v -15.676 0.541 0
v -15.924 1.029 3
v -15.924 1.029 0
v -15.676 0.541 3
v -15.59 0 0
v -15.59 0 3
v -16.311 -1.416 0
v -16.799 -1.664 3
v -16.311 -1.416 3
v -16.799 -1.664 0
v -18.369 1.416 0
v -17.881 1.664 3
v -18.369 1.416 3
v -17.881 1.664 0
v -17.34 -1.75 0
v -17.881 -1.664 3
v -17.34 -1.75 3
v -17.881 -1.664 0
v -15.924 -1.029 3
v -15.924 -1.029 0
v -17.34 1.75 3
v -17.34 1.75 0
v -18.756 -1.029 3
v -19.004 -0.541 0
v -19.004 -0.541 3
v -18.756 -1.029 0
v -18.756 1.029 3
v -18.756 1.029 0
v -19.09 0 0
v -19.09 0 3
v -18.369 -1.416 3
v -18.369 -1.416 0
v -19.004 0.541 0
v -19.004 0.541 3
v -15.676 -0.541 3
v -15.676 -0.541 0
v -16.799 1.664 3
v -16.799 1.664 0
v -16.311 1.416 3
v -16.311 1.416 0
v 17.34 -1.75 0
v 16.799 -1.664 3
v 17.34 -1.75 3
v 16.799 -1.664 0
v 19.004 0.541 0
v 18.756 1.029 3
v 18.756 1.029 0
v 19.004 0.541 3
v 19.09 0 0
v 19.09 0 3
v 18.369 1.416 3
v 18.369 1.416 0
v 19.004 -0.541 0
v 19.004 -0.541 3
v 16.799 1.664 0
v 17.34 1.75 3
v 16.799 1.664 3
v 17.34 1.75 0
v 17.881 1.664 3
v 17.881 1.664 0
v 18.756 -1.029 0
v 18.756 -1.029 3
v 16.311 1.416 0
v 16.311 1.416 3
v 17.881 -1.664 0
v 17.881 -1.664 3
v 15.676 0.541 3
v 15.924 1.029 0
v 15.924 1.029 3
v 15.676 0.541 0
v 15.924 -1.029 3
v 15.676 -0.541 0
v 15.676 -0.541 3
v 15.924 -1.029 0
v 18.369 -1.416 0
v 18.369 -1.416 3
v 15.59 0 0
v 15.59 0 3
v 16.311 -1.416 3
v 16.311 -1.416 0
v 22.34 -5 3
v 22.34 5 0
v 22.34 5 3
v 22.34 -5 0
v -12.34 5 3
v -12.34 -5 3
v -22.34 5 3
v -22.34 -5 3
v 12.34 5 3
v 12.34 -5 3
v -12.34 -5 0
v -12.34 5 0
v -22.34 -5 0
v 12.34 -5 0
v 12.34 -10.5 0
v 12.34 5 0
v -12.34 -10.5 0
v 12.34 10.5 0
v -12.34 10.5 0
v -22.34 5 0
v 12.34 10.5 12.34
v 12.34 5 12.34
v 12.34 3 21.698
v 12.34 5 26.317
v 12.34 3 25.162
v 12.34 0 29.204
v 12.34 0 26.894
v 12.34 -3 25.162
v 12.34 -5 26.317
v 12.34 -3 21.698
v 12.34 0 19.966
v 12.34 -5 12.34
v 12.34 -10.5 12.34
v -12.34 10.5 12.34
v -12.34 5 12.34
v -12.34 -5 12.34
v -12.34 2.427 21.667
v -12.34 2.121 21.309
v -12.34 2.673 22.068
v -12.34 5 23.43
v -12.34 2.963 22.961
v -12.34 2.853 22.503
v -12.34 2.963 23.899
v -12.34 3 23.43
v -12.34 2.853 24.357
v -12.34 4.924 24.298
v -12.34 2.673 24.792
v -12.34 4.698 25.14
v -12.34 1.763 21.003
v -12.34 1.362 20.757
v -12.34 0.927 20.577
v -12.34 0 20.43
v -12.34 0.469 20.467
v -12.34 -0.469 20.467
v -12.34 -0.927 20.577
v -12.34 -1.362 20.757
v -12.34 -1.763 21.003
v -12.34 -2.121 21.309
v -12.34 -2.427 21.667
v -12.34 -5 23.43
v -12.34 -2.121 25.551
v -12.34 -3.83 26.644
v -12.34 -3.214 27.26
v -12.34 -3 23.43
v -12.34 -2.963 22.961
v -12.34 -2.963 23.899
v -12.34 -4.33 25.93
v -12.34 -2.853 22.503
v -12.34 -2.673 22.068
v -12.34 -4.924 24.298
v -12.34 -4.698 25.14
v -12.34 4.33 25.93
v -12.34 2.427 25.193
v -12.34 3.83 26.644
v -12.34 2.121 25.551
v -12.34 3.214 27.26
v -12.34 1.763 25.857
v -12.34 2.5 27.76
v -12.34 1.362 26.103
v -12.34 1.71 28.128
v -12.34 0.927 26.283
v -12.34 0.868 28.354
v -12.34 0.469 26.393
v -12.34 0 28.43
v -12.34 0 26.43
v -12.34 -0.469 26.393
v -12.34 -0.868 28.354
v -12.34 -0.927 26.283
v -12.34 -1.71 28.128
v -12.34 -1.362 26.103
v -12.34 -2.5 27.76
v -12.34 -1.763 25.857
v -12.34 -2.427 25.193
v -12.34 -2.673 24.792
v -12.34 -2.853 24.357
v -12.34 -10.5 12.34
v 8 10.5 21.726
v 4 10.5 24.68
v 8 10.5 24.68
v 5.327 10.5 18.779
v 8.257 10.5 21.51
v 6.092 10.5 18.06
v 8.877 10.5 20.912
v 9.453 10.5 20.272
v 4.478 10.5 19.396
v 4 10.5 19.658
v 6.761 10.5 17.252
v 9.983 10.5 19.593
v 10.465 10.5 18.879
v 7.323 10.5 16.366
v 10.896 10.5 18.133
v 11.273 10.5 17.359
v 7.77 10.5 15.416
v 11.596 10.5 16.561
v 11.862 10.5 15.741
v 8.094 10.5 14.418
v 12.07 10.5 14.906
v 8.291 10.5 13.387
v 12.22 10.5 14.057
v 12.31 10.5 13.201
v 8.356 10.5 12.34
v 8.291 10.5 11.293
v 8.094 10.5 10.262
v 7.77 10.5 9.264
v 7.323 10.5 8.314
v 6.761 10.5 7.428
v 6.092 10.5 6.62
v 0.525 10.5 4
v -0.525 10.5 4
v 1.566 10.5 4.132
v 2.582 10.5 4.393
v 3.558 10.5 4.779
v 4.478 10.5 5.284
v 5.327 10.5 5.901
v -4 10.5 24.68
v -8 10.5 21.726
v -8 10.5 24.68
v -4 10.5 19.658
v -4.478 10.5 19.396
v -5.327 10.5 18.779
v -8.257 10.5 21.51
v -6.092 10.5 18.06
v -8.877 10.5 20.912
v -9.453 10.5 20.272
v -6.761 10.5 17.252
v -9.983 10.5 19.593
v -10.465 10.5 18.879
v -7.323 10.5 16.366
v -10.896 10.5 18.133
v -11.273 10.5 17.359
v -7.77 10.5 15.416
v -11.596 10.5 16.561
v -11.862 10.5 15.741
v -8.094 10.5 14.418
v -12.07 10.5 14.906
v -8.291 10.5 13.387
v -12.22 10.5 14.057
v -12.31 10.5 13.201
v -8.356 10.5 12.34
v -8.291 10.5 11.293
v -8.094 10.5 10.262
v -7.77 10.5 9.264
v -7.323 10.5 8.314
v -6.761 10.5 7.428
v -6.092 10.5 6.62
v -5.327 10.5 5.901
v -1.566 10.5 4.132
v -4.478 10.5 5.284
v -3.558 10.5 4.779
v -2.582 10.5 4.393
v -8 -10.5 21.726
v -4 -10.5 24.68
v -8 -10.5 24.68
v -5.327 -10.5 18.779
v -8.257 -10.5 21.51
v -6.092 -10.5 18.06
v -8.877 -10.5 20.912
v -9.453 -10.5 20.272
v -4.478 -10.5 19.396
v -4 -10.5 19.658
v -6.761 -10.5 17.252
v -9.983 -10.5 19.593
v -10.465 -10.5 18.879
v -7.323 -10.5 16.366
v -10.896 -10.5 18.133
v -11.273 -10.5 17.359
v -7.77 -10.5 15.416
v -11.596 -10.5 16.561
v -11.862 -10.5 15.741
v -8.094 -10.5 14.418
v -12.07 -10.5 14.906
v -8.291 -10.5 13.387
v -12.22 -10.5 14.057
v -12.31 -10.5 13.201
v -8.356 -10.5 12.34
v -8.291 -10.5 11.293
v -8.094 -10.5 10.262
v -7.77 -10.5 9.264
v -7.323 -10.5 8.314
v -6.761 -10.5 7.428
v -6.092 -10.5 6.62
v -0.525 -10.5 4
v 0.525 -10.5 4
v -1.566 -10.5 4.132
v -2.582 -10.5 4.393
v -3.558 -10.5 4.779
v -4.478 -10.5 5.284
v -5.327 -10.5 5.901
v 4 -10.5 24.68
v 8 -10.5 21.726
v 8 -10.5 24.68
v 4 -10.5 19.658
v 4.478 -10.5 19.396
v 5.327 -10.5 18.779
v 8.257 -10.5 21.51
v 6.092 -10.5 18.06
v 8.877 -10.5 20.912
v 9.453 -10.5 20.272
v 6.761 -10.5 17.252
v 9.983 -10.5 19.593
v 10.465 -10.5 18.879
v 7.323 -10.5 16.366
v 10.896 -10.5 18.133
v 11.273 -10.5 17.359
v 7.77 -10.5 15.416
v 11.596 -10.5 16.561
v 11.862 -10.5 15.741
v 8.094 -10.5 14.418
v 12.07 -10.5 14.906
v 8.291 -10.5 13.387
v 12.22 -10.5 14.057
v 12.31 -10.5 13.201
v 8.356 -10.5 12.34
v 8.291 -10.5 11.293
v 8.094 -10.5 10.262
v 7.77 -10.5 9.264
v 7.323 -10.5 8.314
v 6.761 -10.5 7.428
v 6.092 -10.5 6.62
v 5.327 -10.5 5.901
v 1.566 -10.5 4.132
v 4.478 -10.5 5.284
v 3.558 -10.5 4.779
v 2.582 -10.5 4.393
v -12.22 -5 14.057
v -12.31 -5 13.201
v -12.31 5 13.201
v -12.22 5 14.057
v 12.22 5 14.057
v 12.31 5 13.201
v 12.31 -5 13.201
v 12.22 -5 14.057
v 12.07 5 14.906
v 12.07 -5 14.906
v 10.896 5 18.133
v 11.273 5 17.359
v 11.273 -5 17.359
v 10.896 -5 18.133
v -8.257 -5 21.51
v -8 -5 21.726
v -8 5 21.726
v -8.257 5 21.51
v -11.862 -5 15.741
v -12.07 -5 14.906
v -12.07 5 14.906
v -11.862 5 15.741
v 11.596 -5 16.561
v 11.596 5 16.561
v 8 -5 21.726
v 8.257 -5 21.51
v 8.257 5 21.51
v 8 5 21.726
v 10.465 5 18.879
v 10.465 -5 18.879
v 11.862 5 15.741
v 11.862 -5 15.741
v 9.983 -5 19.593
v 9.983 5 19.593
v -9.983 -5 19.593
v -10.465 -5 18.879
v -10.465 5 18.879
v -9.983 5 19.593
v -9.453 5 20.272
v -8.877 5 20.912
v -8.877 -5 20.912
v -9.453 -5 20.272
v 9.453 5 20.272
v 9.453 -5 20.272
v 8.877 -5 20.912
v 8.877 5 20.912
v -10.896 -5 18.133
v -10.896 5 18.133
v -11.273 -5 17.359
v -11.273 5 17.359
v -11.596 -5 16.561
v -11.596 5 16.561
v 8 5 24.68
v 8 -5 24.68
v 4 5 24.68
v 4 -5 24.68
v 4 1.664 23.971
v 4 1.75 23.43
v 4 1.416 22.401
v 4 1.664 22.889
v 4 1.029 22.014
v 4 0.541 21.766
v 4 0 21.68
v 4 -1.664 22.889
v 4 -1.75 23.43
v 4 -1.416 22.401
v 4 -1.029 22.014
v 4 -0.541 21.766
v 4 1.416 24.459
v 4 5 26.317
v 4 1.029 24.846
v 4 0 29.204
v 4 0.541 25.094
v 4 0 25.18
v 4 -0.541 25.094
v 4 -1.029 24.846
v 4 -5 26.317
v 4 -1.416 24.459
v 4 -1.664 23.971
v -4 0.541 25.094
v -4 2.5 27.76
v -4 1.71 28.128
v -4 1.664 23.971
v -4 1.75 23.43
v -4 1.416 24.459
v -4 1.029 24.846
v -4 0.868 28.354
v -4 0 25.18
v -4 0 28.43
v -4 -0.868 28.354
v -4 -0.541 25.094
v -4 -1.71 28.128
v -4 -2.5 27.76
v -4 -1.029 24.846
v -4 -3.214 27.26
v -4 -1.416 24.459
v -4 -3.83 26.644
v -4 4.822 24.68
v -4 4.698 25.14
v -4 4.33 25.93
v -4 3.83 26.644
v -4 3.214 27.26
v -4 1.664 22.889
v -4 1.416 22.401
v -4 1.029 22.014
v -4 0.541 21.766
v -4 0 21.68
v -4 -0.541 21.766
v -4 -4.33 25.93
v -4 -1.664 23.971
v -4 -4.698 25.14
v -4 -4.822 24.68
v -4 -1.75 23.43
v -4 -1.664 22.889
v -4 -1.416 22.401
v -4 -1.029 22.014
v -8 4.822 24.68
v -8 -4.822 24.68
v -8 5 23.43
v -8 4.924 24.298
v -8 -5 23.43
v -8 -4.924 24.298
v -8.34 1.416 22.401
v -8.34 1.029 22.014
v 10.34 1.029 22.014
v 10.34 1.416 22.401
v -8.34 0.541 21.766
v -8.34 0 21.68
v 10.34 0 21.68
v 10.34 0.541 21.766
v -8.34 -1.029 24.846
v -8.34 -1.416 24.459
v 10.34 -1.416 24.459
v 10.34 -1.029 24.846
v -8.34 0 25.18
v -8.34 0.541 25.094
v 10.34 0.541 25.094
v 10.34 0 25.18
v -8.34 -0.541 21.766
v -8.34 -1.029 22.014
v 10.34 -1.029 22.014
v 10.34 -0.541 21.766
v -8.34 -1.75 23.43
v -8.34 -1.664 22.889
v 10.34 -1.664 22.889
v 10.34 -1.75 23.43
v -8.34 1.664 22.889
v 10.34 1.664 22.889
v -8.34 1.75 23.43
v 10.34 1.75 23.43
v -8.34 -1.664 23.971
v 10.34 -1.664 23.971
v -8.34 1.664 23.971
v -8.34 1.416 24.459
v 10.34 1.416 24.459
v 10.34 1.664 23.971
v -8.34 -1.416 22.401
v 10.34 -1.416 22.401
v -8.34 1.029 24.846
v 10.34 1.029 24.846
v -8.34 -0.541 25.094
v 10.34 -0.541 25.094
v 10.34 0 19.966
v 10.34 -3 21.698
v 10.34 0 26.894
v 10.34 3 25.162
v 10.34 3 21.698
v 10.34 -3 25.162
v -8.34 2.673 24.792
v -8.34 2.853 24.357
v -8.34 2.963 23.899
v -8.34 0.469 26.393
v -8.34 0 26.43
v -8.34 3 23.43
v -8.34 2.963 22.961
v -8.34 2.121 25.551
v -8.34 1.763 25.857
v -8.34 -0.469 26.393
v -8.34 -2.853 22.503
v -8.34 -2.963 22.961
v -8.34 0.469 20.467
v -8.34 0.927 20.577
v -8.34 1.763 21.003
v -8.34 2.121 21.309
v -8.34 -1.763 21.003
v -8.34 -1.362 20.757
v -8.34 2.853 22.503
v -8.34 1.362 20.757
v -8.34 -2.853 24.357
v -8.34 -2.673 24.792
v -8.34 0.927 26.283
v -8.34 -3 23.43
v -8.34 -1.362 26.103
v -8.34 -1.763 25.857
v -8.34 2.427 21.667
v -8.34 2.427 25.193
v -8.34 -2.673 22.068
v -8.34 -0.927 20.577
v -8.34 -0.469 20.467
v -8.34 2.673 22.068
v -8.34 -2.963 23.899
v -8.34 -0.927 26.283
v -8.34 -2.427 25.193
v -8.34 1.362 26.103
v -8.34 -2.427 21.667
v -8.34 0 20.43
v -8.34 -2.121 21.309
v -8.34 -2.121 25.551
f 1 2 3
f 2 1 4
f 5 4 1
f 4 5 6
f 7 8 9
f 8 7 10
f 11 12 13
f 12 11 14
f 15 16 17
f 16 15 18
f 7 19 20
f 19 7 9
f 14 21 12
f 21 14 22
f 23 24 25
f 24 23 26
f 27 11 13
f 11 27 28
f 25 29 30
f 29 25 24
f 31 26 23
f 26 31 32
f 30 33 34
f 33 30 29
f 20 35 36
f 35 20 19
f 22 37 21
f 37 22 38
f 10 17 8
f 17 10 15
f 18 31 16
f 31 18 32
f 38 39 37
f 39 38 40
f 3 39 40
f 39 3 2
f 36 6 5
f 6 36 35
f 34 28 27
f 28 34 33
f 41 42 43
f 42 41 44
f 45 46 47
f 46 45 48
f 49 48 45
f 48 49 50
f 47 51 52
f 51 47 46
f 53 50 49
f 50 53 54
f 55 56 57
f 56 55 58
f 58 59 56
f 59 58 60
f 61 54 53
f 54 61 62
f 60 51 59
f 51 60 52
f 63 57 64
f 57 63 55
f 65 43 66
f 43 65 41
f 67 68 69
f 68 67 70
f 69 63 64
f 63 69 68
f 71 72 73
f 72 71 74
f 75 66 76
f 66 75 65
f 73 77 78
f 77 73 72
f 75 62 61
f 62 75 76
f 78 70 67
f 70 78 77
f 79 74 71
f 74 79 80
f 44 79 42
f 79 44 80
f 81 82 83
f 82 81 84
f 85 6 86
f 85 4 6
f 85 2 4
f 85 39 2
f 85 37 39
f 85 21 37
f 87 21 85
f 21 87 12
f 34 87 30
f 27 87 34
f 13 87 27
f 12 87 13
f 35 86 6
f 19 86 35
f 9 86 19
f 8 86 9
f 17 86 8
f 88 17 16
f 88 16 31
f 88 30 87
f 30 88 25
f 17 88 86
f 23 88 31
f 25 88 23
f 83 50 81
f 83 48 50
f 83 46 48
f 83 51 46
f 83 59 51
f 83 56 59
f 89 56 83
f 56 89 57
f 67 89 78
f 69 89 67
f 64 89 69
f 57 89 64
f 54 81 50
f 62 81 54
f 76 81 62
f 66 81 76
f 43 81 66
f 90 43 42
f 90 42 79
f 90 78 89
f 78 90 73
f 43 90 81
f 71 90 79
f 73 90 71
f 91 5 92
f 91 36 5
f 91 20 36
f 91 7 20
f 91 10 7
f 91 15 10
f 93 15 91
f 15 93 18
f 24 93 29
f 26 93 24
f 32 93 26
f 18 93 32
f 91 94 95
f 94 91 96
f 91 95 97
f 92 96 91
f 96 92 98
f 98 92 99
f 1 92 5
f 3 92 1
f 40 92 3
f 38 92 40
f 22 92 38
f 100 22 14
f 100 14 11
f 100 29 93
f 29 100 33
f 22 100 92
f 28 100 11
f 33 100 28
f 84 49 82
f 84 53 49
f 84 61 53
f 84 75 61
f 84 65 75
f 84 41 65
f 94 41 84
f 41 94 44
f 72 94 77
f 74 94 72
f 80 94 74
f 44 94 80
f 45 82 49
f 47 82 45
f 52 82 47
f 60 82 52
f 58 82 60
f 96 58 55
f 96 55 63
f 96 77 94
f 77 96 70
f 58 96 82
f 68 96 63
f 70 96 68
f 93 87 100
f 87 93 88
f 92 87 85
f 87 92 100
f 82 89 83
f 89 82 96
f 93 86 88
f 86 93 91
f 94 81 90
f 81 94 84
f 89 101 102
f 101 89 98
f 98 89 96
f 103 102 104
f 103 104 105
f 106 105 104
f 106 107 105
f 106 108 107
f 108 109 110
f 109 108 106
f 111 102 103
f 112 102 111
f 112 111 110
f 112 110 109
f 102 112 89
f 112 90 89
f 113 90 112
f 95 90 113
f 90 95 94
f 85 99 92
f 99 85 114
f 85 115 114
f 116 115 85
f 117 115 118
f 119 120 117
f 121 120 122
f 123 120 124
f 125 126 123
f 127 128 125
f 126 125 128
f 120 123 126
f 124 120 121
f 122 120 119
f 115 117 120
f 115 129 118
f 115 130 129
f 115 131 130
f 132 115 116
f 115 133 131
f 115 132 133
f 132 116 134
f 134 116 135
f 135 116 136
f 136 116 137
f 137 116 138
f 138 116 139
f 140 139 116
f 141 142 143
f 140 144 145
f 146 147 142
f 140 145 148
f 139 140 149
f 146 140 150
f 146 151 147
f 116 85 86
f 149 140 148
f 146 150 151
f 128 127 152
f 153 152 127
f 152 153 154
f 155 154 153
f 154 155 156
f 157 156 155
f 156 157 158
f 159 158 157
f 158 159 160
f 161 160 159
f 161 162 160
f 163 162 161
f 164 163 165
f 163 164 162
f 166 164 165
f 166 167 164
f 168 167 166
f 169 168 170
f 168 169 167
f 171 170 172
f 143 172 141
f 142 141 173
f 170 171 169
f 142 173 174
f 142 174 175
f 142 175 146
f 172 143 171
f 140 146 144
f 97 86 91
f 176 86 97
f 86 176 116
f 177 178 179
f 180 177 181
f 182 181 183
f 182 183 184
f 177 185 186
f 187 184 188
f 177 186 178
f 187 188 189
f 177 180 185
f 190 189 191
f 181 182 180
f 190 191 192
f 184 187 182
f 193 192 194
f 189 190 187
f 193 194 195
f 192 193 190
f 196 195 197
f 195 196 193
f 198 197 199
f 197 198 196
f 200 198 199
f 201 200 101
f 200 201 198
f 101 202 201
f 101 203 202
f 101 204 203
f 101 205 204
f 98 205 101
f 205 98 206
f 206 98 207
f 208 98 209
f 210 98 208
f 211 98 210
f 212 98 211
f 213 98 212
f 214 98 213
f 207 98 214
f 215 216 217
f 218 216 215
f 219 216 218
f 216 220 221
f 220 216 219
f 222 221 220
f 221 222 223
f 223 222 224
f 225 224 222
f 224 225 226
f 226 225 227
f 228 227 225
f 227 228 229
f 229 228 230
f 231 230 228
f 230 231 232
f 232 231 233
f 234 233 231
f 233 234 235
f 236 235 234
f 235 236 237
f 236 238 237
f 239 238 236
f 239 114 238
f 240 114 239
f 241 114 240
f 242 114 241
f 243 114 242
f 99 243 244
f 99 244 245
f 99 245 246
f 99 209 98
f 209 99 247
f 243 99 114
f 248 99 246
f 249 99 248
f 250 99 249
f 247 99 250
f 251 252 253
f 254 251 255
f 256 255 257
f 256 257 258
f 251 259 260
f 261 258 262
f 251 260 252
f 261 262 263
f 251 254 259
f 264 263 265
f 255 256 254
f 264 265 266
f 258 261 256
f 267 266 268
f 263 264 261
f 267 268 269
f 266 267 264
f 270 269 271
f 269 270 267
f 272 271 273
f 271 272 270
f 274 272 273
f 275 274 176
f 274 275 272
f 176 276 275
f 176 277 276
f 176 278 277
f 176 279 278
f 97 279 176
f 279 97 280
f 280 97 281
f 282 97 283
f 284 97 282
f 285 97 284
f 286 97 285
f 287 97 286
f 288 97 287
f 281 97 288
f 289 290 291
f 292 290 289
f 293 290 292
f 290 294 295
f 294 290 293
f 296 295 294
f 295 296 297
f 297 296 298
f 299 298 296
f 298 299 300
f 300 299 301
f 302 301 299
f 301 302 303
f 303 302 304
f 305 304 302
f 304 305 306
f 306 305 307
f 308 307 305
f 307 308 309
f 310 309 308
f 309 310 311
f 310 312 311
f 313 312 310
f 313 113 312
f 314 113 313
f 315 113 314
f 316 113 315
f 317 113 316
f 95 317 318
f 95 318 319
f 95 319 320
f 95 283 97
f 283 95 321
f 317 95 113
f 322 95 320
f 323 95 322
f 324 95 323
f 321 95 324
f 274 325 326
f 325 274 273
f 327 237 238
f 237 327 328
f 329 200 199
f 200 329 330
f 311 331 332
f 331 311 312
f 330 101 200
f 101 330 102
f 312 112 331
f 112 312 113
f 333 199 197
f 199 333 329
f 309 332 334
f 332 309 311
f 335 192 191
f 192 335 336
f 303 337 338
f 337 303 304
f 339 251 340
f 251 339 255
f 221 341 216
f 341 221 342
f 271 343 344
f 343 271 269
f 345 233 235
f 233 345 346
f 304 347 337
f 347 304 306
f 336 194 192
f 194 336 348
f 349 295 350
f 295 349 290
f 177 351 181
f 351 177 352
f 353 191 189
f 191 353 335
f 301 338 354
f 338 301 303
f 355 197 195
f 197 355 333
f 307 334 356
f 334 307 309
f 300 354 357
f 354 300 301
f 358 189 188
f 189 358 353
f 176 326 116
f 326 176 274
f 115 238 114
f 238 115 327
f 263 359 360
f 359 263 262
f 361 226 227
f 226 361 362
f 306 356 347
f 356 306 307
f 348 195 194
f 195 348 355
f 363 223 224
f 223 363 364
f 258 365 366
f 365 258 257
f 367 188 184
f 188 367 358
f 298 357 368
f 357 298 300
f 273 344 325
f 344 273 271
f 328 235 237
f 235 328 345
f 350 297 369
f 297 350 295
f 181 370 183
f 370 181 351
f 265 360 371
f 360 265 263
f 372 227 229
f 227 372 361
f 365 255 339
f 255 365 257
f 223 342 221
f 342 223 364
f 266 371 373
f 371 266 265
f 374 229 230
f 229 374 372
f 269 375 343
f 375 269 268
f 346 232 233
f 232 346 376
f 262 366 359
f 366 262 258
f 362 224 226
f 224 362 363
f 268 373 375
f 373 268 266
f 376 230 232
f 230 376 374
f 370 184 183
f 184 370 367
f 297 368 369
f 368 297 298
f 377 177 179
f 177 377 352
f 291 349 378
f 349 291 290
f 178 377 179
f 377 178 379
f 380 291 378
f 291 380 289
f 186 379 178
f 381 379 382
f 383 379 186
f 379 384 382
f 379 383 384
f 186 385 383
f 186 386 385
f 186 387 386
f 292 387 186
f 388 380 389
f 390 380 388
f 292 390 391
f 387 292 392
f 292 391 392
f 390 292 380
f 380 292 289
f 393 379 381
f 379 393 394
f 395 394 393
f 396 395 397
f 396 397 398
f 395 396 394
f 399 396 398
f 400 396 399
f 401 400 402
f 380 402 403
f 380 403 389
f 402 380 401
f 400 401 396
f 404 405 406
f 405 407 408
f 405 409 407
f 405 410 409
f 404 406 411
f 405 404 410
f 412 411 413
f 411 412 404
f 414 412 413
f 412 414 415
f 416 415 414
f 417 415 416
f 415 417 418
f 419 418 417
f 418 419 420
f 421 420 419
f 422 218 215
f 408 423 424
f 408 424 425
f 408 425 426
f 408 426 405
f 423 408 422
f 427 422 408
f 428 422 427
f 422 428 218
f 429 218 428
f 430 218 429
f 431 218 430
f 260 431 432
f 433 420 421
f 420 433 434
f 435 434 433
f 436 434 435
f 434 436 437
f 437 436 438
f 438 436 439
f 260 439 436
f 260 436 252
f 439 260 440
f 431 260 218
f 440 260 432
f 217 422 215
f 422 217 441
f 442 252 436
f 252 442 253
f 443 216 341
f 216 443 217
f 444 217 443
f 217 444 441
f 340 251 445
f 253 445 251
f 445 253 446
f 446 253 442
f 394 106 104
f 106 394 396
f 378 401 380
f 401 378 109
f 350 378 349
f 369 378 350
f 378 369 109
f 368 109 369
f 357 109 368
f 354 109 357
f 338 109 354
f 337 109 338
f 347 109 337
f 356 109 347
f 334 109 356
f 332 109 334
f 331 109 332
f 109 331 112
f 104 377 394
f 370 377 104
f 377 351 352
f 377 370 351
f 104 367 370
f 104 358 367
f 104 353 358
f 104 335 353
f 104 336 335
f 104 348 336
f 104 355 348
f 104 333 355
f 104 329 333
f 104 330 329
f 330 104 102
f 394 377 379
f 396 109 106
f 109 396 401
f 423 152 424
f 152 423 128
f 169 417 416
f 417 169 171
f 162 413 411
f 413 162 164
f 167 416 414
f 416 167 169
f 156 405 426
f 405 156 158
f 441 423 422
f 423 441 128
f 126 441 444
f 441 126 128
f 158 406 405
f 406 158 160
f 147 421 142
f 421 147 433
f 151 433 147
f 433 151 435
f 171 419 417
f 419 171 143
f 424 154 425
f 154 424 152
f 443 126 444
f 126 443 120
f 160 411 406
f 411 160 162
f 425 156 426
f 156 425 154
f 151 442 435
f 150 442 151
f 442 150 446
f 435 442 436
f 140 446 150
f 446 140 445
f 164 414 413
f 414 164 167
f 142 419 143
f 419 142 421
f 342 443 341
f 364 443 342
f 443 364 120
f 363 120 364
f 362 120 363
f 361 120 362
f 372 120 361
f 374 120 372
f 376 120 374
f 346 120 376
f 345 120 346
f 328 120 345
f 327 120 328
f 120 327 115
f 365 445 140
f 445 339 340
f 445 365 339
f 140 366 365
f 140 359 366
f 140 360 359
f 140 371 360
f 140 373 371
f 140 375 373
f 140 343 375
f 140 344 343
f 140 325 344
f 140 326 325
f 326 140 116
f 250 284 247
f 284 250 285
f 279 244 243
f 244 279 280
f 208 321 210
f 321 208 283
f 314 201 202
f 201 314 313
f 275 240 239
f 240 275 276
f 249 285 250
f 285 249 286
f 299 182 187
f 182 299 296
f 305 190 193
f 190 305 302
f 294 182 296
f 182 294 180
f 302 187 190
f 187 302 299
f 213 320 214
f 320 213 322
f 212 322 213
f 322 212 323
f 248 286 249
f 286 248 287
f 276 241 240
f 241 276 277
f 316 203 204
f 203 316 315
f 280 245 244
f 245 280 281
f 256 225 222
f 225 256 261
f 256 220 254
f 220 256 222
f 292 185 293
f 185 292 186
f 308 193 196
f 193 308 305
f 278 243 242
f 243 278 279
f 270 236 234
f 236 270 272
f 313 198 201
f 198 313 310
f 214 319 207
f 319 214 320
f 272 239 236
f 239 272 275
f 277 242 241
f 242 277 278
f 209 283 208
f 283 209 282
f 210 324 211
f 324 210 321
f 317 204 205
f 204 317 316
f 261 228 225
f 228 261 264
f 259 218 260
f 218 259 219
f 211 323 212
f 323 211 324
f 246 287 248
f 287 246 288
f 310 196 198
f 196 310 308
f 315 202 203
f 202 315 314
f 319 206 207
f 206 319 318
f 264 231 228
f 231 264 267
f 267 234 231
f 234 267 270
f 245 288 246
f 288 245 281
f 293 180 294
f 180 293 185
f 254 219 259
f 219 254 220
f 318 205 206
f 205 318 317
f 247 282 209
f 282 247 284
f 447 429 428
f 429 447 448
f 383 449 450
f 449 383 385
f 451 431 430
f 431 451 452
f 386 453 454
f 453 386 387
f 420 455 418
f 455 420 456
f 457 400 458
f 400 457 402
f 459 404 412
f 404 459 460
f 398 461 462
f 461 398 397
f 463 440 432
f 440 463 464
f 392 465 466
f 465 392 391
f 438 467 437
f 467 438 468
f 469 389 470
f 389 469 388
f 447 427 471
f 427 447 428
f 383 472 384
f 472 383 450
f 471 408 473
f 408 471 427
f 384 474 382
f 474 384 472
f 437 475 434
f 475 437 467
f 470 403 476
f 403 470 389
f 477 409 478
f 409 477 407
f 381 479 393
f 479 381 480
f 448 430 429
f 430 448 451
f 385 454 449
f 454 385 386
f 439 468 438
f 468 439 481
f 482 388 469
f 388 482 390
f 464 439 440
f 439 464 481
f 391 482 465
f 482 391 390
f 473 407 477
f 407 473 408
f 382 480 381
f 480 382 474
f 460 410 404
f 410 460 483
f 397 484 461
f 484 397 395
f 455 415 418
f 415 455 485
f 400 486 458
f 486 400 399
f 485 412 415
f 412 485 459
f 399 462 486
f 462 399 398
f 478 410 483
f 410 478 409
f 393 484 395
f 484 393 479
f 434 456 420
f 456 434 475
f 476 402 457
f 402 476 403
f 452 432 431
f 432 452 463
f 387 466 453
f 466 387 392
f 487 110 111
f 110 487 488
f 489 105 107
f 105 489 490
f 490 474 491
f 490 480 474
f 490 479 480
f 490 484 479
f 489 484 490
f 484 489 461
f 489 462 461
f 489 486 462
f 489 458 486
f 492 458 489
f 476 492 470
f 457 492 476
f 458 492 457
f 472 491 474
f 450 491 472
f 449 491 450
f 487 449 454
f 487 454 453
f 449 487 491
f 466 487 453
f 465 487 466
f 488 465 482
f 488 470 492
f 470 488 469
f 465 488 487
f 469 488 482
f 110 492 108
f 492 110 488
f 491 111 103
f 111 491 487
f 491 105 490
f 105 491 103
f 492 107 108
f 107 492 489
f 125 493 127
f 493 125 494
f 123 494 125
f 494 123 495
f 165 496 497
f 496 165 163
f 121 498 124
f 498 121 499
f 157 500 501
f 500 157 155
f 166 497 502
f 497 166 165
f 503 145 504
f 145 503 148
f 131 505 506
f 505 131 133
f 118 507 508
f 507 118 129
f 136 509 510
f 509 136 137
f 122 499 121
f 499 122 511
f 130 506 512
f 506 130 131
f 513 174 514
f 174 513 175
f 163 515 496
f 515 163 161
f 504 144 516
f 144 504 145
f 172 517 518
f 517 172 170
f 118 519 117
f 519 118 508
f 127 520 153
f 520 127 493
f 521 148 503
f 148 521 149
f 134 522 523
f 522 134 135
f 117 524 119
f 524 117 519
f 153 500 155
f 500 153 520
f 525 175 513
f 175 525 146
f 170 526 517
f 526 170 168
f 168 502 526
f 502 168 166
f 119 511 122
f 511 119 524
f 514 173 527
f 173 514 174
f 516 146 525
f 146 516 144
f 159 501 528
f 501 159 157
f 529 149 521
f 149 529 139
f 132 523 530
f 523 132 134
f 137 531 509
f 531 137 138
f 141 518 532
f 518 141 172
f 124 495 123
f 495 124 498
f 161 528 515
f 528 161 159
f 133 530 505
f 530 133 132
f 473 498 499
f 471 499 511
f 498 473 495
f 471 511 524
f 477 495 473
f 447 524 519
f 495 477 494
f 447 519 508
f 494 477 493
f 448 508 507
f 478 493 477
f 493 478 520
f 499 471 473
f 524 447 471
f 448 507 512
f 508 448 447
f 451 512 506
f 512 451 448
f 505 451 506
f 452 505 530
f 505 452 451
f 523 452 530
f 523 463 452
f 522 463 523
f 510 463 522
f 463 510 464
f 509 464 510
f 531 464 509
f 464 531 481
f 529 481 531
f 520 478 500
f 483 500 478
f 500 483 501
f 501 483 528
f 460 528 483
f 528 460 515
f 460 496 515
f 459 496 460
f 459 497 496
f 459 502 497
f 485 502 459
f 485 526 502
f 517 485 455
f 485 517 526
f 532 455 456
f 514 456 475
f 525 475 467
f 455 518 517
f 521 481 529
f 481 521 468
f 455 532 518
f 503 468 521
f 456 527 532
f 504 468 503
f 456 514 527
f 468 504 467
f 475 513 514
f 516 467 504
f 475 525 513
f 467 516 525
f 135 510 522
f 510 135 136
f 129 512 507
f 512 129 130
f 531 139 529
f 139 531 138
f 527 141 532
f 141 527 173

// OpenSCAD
// TFZB holder
// *********************************************
// Marcin Lukasik <marcin@lukasik.name>
// http://marcin.name
// http://www.thingiverse.com/nothinman
// *********************************************
// derived from:
// http://www.thingiverse.com/thing:14942

// TFZB/rod dimensions
TFZB_dia = 16.08 + 0.6; //adding 0.6 for clearance
TFZB_length = 21;
rod_dia = 12;

//screw/nut dimensions (M3) - hexagon socket head cap screw ISO 4762, hexagon nut ISO 4032
screw_thread_dia_iso = 3;
screw_head_dia_iso = 5.5;
screw_head_height = 4;
nut_wrench_size_iso = 5.5;
nut_height = 2;

// screw/nut dimensions for use (plus clearance for fitting purpose)
clearance_dia = 0.5;
screw_thread_dia = screw_thread_dia_iso + clearance_dia;
screw_head_dia = screw_head_dia_iso + clearance_dia;
nut_wrench_size = nut_wrench_size_iso + clearance_dia;
nut_dia_perimeter = (nut_wrench_size/cos(30));
nut_dia = nut_dia_perimeter;
nut_surround_thickness = 2;

// main body dimensions
body_wall_thickness = 4;
body_width = TFZB_dia + (2*body_wall_thickness);
body_height = body_width;
body_length = TFZB_length;
//gap_width = rod_dia + 2;
gap_width = 8;
screw_bushing_space = 1;
screw_elevation = TFZB_dia + body_wall_thickness + (screw_thread_dia/2) + screw_bushing_space;

// TEST - uncomment to render in openscad:
tfzb_holder(1);		// WITH mountplate
//tfzb_holder();		// WITHOUT mountplate


// nophead's polyhole module for better fit
module polyhole(d,h) {
    n = max(round(3 * d),3);
    rotate([0,0,180])
        cylinder(h = h, r = (d / 2) / cos (180 / n), $fn = n);
}


module mount_plate()
{
	difference()
	{
		translate([0,0,1.5])
		cube([body_width+2*screw_head_dia+4*nut_surround_thickness,screw_head_dia+2*nut_surround_thickness,3], center=true);

		for(i=[-1,1])
			translate([i*(body_width/2+nut_surround_thickness+screw_head_dia/2),0,-0.5])
				cylinder(r=screw_thread_dia/2, h=4, $fn=20);
	}
}

// main body
module tfzb_holder(with_mountplate=false)
{
	difference()
	{
		union()
		{
			if (with_mountplate) 
			mount_plate();
	
			// body
			translate([0,0,body_height/4])
				cube([body_width,body_length,body_height/2], center=true);
			translate([0,0,(TFZB_dia/2)+body_wall_thickness])		
				rotate([90,0,0])
					cylinder(r=(TFZB_dia/2)+body_wall_thickness, h=TFZB_length, center=true, $fn=90);
	
			// gap support
			translate([gap_width/2, -(body_length/2), body_height-((TFZB_dia/2)+screw_bushing_space+(screw_thread_dia/2))])
				cube([body_wall_thickness,TFZB_length,(TFZB_dia/2)+screw_bushing_space+(screw_thread_dia/2)]);
			translate([-(gap_width/2)-body_wall_thickness, -(body_length/2), body_height-((TFZB_dia/2)+screw_bushing_space+(screw_thread_dia/2))])
				cube([body_wall_thickness,TFZB_length,(TFZB_dia/2)+screw_bushing_space+(screw_thread_dia/2)]);
	
			// nut trap surround
			translate([gap_width/2,0,screw_elevation])
				rotate([0,90,0])
					cylinder(r=(((nut_wrench_size+nut_surround_thickness*2)/cos(30))/2), h=(body_width-gap_width)/2, $fn=6);
			translate([gap_width/2+(body_width-gap_width)/4,0,screw_elevation/2])
				cube([(body_width-gap_width)/2,nut_wrench_size+(nut_surround_thickness*2),screw_elevation],center=true);

			// Screw hole surround
			translate([-gap_width/2,0,screw_elevation])
				rotate([0,-90,0])
					cylinder(r=(screw_head_dia/2)+nut_surround_thickness, h=(body_width-gap_width)/2, $fn=36);
			translate([-(gap_width/2+(body_width-gap_width)/4),0,screw_elevation/2])
				cube([(body_width-gap_width)/2,screw_head_dia+(nut_surround_thickness*2),screw_elevation],center=true);
		}
	
		// bushing hole
		translate([0,0,TFZB_dia/2+body_wall_thickness])
			rotate([90,0,0])
//				cylinder(r=TFZB_dia/2, h=TFZB_length+1, center=true);
				translate([0,0,-(TFZB_length+1)/2]) polyhole(TFZB_dia,TFZB_length+1);	// TESTING POLYHOLE MODULE FOR BETTER TFZB FIT
	
		// top gap
		translate([-(gap_width/2),-(body_length/2)-1,body_height/2])
			cube([gap_width,TFZB_length+2,(TFZB_dia/2)+screw_bushing_space+(screw_thread_dia/2)+(nut_dia/2)+nut_surround_thickness+1]);
	
		// screw hole (one all the way through)
		translate([0,0,screw_elevation])
			rotate([0,90,0])
				cylinder(r=screw_thread_dia/2, h=body_width+3, center=true, $fn=20);
	
		// nut trap
		translate([body_width/2-nut_height, 0, screw_elevation])
			rotate([0,90,0])
				cylinder(r=nut_dia/2, h=body_width/2-gap_width/2-body_wall_thickness+1,$fn=6);
	
		// screw head hole
		translate([-(body_width/2-screw_head_height), 0, screw_elevation])
			rotate([0,-90,0])
				cylinder(r=screw_head_dia/2, h=body_width/2-gap_width/2-body_wall_thickness+2,$fn=40);
	
	}
}
